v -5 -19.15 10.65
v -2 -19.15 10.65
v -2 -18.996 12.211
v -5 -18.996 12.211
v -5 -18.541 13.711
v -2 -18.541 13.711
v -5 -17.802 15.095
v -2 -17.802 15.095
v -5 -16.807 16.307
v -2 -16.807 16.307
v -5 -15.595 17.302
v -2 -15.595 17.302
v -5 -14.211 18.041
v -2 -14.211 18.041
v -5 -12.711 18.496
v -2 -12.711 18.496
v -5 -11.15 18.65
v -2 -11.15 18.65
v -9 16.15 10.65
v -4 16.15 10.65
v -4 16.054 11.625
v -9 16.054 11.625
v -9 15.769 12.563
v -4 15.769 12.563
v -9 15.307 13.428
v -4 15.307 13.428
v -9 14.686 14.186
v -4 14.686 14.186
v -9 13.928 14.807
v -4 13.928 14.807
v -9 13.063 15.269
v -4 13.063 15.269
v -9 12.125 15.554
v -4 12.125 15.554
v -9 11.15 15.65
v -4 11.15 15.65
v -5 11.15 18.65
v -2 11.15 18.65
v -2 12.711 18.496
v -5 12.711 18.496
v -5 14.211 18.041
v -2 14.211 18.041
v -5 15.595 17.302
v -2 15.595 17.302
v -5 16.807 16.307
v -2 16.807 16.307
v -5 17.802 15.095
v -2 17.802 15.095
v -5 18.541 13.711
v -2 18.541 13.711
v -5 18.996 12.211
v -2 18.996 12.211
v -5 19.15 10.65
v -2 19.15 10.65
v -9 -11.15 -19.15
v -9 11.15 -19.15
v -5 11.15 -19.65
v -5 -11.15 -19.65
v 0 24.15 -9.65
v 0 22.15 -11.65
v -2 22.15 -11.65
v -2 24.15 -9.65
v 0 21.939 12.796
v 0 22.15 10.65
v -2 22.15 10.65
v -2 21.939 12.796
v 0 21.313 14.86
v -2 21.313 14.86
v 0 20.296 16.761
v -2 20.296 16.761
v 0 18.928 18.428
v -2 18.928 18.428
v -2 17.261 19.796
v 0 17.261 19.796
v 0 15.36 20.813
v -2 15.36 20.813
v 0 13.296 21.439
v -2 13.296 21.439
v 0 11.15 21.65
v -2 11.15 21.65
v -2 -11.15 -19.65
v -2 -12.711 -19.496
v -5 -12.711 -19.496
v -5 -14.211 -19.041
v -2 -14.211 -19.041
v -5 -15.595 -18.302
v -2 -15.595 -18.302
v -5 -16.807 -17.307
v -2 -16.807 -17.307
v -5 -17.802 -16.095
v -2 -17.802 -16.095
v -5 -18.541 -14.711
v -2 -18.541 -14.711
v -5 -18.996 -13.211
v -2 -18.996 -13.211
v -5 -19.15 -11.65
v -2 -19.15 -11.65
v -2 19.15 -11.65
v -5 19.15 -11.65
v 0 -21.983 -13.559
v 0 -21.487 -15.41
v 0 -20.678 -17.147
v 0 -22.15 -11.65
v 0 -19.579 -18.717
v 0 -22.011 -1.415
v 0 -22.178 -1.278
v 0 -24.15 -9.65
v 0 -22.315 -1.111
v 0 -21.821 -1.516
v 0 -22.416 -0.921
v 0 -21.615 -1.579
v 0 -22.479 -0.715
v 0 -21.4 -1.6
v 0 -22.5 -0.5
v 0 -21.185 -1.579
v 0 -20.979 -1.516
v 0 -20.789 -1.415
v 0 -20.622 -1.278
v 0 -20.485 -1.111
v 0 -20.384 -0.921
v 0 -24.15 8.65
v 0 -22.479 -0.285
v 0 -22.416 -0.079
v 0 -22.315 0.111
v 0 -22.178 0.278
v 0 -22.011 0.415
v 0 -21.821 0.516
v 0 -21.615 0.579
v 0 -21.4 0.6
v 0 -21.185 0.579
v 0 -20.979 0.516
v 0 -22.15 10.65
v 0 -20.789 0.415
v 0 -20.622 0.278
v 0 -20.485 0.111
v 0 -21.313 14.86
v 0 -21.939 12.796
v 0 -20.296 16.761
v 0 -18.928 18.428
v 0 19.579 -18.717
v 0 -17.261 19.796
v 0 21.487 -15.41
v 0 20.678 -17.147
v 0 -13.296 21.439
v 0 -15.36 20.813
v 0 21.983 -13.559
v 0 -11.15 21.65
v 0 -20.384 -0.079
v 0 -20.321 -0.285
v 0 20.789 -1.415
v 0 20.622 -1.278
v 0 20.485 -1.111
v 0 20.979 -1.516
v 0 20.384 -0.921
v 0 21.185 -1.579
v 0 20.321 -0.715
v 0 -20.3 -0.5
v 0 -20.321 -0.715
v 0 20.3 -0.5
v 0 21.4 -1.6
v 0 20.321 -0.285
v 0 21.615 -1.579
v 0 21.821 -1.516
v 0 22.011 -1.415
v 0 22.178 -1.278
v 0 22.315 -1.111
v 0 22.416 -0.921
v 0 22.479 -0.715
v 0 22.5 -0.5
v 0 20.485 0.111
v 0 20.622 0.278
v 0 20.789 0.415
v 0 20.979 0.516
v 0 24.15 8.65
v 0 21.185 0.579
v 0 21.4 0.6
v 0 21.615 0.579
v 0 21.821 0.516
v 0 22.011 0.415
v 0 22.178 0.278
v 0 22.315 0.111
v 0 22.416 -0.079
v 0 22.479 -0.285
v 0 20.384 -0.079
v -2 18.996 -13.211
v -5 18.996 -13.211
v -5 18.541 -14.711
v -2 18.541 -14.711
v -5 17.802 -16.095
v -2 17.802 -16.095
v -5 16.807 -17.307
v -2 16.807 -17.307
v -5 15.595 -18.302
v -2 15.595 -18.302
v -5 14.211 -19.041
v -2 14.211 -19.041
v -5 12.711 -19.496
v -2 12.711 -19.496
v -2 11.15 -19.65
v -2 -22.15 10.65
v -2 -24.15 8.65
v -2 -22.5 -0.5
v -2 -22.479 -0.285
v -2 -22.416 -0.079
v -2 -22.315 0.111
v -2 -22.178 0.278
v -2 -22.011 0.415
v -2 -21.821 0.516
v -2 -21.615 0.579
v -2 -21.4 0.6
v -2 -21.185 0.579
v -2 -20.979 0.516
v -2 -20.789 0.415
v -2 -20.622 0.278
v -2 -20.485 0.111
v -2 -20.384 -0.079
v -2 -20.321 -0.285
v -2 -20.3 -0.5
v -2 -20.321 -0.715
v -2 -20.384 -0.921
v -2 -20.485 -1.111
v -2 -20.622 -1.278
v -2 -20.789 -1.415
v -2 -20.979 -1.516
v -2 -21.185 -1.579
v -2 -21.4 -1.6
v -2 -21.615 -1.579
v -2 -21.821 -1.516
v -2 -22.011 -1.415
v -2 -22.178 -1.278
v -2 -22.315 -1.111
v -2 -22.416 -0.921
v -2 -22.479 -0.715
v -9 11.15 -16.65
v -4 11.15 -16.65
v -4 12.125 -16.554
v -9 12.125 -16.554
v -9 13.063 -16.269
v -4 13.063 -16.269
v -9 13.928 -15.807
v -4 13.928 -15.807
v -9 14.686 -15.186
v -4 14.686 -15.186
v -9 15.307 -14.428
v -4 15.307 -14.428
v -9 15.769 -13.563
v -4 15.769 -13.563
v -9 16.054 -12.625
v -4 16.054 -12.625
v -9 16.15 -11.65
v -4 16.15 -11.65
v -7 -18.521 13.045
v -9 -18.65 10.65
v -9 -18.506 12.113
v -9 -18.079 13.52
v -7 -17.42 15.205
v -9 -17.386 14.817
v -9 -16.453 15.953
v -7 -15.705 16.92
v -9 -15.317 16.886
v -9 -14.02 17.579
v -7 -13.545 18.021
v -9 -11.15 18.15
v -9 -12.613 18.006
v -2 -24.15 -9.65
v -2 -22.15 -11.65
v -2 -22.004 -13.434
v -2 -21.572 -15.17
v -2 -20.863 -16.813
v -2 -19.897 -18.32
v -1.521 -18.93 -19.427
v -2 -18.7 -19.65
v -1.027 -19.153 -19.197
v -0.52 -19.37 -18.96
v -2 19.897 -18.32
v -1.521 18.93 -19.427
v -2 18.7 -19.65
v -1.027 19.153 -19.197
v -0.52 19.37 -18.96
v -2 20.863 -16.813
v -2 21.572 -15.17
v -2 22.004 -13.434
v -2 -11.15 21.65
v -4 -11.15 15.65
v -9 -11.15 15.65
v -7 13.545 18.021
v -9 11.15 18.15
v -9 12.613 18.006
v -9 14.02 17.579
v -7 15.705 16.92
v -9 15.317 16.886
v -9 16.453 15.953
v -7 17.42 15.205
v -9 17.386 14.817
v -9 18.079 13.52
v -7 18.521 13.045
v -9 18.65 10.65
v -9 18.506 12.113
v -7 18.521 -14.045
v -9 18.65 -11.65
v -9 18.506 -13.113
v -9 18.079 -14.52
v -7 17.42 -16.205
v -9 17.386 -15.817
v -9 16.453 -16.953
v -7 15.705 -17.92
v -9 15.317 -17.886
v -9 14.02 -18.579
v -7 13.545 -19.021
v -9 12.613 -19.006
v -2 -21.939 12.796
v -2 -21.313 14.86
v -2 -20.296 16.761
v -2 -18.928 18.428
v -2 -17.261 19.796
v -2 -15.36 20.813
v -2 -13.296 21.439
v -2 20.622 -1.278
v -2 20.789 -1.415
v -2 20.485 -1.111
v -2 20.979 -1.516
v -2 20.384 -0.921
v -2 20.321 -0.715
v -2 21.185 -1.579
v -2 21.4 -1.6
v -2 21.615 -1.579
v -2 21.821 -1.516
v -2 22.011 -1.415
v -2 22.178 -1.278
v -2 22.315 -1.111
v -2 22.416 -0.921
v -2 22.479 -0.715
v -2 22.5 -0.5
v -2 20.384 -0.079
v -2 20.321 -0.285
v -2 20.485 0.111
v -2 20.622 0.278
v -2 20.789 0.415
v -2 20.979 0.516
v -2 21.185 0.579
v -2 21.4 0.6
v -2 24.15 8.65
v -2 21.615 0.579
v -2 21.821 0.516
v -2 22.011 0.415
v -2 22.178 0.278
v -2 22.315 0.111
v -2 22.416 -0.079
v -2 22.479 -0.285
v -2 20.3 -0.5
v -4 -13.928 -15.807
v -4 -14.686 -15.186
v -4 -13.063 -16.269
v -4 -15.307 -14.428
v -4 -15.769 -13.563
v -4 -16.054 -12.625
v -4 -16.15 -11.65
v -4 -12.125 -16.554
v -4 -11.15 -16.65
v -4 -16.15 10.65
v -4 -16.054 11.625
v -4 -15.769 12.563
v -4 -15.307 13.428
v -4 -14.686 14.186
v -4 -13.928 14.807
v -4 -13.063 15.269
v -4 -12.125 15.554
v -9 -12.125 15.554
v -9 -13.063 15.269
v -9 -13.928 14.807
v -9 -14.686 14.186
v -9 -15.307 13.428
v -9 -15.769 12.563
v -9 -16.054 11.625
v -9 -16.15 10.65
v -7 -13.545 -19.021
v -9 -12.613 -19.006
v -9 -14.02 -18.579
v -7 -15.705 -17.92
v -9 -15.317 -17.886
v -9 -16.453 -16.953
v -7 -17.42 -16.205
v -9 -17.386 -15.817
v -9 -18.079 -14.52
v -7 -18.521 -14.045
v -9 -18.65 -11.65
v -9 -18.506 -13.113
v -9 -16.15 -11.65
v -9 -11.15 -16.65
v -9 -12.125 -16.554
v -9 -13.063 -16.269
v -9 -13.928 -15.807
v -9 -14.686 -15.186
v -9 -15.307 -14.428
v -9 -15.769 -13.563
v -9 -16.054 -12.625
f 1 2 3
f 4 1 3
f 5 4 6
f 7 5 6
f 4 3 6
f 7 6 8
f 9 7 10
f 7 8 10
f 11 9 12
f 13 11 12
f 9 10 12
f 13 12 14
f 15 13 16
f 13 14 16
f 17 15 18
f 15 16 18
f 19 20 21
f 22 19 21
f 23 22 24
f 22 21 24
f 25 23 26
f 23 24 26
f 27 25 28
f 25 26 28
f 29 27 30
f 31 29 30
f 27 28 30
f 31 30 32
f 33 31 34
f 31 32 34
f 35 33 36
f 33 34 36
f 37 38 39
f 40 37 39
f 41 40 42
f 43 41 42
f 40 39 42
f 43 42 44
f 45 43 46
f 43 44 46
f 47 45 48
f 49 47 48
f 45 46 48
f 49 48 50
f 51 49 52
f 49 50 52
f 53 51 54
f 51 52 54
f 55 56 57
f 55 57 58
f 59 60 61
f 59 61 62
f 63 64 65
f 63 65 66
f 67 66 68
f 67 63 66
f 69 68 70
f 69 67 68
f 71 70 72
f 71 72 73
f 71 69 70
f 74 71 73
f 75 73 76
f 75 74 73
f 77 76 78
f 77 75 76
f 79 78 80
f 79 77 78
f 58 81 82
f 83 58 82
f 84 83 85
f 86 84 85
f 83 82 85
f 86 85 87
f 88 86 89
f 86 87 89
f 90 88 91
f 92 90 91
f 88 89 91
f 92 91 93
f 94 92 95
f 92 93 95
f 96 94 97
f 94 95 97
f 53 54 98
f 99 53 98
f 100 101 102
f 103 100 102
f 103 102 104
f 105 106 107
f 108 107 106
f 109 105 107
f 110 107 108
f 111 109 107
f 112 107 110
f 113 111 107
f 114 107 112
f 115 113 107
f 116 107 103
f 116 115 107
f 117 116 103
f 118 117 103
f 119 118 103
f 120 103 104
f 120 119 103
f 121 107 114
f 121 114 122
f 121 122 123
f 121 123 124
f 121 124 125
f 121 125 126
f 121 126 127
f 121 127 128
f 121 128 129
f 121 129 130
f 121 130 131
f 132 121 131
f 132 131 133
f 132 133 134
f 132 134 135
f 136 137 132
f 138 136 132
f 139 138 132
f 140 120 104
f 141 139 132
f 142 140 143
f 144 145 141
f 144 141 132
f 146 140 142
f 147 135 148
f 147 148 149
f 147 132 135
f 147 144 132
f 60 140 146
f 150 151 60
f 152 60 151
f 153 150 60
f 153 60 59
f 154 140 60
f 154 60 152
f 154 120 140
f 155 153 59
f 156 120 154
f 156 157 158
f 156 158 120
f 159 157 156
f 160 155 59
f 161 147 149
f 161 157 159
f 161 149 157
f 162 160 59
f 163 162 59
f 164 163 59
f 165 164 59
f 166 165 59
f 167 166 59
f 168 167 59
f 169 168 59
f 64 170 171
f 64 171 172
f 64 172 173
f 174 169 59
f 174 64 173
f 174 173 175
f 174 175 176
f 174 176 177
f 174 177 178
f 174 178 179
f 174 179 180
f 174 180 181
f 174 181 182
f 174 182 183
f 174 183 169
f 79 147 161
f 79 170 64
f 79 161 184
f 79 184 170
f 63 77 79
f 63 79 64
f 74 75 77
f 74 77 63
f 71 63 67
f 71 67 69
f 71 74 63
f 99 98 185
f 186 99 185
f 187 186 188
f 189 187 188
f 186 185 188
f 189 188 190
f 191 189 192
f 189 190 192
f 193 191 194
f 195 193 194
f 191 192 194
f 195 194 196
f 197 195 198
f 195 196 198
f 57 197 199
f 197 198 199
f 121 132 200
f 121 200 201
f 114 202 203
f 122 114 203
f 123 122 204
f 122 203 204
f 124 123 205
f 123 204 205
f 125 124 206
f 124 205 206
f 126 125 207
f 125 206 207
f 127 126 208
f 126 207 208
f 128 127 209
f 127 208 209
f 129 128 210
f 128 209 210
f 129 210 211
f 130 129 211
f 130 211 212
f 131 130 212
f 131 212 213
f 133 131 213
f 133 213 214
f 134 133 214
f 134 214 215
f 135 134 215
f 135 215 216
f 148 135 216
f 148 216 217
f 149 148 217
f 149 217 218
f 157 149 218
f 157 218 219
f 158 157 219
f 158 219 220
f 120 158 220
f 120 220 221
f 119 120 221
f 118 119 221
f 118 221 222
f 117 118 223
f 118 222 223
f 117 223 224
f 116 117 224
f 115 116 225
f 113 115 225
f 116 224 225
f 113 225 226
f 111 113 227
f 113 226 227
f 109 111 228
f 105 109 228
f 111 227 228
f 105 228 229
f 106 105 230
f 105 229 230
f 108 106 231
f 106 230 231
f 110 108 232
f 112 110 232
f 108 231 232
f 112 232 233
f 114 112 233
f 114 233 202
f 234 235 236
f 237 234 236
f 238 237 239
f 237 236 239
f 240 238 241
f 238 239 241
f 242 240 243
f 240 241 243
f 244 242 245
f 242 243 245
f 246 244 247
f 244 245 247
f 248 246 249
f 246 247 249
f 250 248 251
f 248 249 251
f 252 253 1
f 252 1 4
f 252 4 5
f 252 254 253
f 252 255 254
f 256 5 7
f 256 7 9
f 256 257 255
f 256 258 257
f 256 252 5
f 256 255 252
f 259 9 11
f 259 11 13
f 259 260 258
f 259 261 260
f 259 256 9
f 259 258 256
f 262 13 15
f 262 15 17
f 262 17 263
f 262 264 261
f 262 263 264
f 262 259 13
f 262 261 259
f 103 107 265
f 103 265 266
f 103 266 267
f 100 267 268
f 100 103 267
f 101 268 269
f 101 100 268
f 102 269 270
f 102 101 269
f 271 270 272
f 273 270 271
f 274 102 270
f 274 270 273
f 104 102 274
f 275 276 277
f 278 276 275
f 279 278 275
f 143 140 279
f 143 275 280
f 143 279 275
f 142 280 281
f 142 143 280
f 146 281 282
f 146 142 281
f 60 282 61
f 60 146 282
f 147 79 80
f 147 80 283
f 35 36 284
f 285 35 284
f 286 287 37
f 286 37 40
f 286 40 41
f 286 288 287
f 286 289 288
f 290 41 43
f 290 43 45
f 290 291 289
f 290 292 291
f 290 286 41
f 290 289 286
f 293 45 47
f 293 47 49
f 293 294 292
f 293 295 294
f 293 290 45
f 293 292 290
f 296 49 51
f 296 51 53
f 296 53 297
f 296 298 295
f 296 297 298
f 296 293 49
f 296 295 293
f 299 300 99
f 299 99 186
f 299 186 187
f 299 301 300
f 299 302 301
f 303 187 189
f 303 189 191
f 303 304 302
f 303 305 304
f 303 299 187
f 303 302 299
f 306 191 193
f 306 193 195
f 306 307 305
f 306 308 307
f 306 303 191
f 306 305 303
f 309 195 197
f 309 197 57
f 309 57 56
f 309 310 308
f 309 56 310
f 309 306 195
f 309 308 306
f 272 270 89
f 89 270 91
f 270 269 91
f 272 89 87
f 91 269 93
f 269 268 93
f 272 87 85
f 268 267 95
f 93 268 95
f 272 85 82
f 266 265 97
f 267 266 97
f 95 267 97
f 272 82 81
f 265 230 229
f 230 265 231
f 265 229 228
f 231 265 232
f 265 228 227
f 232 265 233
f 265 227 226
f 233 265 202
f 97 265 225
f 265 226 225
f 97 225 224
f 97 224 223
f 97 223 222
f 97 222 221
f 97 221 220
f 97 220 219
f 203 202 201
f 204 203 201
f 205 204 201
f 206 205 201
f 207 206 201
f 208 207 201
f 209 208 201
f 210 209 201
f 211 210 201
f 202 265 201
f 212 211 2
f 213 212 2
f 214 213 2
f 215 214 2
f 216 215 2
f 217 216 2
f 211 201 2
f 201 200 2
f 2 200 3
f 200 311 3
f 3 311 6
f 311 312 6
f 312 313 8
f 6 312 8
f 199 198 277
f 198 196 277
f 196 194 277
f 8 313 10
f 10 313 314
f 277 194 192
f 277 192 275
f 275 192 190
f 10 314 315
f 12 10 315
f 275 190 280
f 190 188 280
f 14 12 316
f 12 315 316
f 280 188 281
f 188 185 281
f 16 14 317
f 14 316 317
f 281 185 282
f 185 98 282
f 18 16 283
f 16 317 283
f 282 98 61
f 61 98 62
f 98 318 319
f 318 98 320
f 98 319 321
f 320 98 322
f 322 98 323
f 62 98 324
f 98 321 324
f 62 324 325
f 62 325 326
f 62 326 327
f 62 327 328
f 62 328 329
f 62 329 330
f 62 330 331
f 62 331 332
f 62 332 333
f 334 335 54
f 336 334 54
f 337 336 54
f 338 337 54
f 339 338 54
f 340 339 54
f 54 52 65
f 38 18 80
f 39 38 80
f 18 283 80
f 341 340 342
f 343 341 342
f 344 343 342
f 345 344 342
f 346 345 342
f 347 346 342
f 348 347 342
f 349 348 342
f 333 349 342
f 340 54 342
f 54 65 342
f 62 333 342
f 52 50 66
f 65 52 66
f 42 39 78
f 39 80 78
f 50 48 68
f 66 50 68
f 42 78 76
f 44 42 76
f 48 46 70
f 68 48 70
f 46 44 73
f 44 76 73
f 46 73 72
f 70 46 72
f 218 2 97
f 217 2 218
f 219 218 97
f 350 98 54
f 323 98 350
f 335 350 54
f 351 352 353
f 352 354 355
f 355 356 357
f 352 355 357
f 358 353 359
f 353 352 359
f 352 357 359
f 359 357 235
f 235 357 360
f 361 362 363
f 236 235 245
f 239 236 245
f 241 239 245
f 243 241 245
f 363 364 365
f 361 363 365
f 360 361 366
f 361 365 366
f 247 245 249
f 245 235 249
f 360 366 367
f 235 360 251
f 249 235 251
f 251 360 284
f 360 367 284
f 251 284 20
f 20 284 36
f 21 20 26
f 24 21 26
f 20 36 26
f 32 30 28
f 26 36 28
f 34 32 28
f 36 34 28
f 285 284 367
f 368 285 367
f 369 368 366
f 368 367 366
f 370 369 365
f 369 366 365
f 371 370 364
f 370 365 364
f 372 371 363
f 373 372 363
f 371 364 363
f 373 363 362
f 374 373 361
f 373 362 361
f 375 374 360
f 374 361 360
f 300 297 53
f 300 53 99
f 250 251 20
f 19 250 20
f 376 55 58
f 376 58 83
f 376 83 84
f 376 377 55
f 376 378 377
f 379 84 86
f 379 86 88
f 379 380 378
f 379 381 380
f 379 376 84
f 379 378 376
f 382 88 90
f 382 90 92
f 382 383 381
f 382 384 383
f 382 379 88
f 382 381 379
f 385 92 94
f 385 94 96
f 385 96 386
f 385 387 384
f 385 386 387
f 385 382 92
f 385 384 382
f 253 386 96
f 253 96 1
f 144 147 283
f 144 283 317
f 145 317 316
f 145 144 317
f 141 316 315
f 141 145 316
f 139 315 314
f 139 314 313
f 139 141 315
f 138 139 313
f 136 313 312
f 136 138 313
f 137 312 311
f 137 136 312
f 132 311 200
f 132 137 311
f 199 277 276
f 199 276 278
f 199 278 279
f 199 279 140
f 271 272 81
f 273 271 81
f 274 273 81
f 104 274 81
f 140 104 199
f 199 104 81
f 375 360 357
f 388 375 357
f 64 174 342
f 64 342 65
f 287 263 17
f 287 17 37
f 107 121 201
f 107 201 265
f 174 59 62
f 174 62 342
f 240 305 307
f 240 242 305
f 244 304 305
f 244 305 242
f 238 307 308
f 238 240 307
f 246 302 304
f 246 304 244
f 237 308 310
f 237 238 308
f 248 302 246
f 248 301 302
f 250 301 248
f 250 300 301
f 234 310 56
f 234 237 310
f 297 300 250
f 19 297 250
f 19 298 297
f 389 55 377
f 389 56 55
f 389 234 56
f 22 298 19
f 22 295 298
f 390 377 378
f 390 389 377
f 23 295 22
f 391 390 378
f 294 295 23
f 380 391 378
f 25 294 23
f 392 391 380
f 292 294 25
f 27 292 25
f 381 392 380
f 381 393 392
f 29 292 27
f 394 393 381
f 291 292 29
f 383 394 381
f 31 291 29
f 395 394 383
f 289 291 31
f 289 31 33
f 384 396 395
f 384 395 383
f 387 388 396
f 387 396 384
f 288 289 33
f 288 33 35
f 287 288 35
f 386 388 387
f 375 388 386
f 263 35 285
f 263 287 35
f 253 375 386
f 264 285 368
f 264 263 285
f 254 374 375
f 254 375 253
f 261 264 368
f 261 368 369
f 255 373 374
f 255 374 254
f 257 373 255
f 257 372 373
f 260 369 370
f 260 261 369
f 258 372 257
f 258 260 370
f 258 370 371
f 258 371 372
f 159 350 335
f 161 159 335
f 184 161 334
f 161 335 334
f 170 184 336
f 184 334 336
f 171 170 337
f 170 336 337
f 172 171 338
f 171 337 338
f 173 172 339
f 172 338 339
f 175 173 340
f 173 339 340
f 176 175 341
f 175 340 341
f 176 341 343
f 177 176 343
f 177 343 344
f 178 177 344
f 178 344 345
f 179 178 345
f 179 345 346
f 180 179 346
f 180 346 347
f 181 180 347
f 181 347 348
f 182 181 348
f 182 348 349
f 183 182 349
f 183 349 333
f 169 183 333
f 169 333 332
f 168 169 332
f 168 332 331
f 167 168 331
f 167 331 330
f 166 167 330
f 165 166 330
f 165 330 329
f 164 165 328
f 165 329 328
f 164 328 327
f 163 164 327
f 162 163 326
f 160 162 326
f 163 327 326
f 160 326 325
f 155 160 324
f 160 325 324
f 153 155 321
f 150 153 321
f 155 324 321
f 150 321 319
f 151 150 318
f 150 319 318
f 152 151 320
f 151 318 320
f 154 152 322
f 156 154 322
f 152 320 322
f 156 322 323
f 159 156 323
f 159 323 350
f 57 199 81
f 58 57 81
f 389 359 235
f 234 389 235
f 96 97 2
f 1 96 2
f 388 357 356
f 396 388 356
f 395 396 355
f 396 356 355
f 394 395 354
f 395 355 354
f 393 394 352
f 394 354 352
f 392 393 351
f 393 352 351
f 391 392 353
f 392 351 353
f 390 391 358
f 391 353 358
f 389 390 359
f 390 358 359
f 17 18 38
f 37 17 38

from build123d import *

# Parameters (mm, degrees)
F1_DEPTH = 2
F2_DEPTH = 4
F4_W     = 23.5562745947
F4_H     = 63.5293796659
F5_DEPTH = 3.5651598846
F7_DEPTH = 5
F8_SIZE2 = 0.5
F8_SIZE  = 4
F9_D     = 2.2


with BuildPart() as f1:
    # F0 (on Right) → F1 (new body)
    with BuildSketch(Plane.YZ):
        with BuildLine():
            Line((11.15, 21.65), (-11.15, 21.65))
            ThreePointArc((-11.15, 21.65), (-18.9281745931, 18.4281745931), (-22.15, 10.65))
            Line((-22.15, 10.65), (-22.15, -11.65))
            ThreePointArc((-22.15, -11.65), (-18.9281745931, -19.4281745931), (-11.15, -22.65))
            Line((-11.15, -22.65), (11.15, -22.65))
            ThreePointArc((11.15, -22.65), (18.9281745931, -19.4281745931), (22.15, -11.65))
            Line((22.15, -11.65), (22.15, 10.65))
            ThreePointArc((22.15, 10.65), (18.9281745931, 18.4281745931), (11.15, 21.65))
        make_face()
        with BuildLine():
            ThreePointArc((-19.15, 10.65), (-16.8068542495, 16.3068542495), (-11.15, 18.65))
            Line((-11.15, 18.65), (11.15, 18.65))
            ThreePointArc((11.15, 18.65), (16.8068542495, 16.3068542495), (19.15, 10.65))
            Line((19.15, 10.65), (19.15, -11.65))
            ThreePointArc((19.15, -11.65), (16.8068542495, -17.3068542495), (11.15, -19.65))
            Line((11.15, -19.65), (-11.15, -19.65))
            ThreePointArc((-11.15, -19.65), (-16.8068542495, -17.3068542495), (-19.15, -11.65))
            Line((-19.15, -11.65), (-19.15, 10.65))
        make_face(mode=Mode.SUBTRACT)
        with BuildLine():
            Line((11.15, 18.65), (-11.15, 18.65))
            ThreePointArc((-11.15, 18.65), (-16.8068542495, 16.3068542495), (-19.15, 10.65))
            Line((-19.15, 10.65), (-19.15, -11.65))
            ThreePointArc((-19.15, -11.65), (-16.8068542495, -17.3068542495), (-11.15, -19.65))
            Line((-11.15, -19.65), (11.15, -19.65))
            ThreePointArc((11.15, -19.65), (16.8068542495, -17.3068542495), (19.15, -11.65))
            Line((19.15, -11.65), (19.15, 10.65))
            ThreePointArc((19.15, 10.65), (16.8068542495, 16.3068542495), (11.15, 18.65))
        make_face()
        Polygon((-22.15, -11.65), (-22.15, 10.65), (-24.15, 8.65), (-24.15, -9.65), align=None)
        Polygon((24.15, 8.65), (22.15, 10.65), (22.15, -11.65), (24.15, -9.65), align=None)
    extrude(amount=-F1_DEPTH)

    # F0 (on Right) → F2 (join)
    with BuildSketch(Plane.YZ):
        with BuildLine():
            Line((11.15, 18.65), (-11.15, 18.65))
            ThreePointArc((-11.15, 18.65), (-16.8068542495, 16.3068542495), (-19.15, 10.65))
            Line((-19.15, 10.65), (-19.15, -11.65))
            ThreePointArc((-19.15, -11.65), (-16.8068542495, -17.3068542495), (-11.15, -19.65))
            Line((-11.15, -19.65), (11.15, -19.65))
            ThreePointArc((11.15, -19.65), (16.8068542495, -17.3068542495), (19.15, -11.65))
            Line((19.15, -11.65), (19.15, 10.65))
            ThreePointArc((19.15, 10.65), (16.8068542495, 16.3068542495), (11.15, 18.65))
        make_face()
    extrude(amount=-F2_DEPTH)

    # F4 (on face) → F5 (cut, through all)
    with BuildSketch(Plane(origin=(7.1691742633, 0, -15.3743438221), x_dir=(0.906307787, 0, 0.4226182617), z_dir=(0.4226182617, 0, -0.906307787))):
        with Locations((-8.6737343809, -4.5895911753)):
            Rectangle(F4_W, F4_H)
    extrude(amount=F5_DEPTH, mode=Mode.SUBTRACT)

    # F6 (on face) → F7 (join)
    with BuildSketch(Plane(origin=(-4, 0, 0), x_dir=(0, -1, 0), z_dir=(-1, 0, 0))):
        with BuildLine():
            ThreePointArc((19.15, 10.65), (16.8068542495, 16.3068542495), (11.15, 18.65))
            Line((11.15, 18.65), (-11.15, 18.65))
            ThreePointArc((-11.15, 18.65), (-16.8068542495, 16.3068542495), (-19.15, 10.65))
            Line((-19.15, 10.65), (-19.15, -11.65))
            ThreePointArc((-19.15, -11.65), (-16.8068542495, -17.3068542495), (-11.15, -19.65))
            Line((-11.15, -19.65), (11.15, -19.65))
            ThreePointArc((11.15, -19.65), (16.8068542495, -17.3068542495), (19.15, -11.65))
            Line((19.15, -11.65), (19.15, 10.65))
        make_face()
        with BuildLine():
            ThreePointArc((11.15, 15.65), (14.6855339059, 14.1855339059), (16.15, 10.65))
            Line((16.15, 10.65), (16.15, -11.65))
            ThreePointArc((16.15, -11.65), (14.6855339059, -15.1855339059), (11.15, -16.65))
            Line((11.15, -16.65), (-11.15, -16.65))
            ThreePointArc((-11.15, -16.65), (-14.6855339059, -15.1855339059), (-16.15, -11.65))
            Line((-16.15, -11.65), (-16.15, 10.65))
            ThreePointArc((-16.15, 10.65), (-14.6855339059, 14.1855339059), (-11.15, 15.65))
            Line((-11.15, 15.65), (11.15, 15.65))
        make_face(mode=Mode.SUBTRACT)
    extrude(amount=F7_DEPTH)

    # F8
    f8_edges = [f1.edges().sort_by_distance(p)[0] for p in [
        (-9, -16.806854, -17.306854),
        (-9, 0, -19.65),
        (-9, -19.15, -0.5),
    ]]
    chamfer(f8_edges, length=F8_SIZE, length2=F8_SIZE2)

    # F9 (through all)
    with Locations(Plane.YZ):
        with Locations((-21.4, -0.5), (21.4, -0.5)):
            Hole(F9_D / 2)


solid = f1.part
